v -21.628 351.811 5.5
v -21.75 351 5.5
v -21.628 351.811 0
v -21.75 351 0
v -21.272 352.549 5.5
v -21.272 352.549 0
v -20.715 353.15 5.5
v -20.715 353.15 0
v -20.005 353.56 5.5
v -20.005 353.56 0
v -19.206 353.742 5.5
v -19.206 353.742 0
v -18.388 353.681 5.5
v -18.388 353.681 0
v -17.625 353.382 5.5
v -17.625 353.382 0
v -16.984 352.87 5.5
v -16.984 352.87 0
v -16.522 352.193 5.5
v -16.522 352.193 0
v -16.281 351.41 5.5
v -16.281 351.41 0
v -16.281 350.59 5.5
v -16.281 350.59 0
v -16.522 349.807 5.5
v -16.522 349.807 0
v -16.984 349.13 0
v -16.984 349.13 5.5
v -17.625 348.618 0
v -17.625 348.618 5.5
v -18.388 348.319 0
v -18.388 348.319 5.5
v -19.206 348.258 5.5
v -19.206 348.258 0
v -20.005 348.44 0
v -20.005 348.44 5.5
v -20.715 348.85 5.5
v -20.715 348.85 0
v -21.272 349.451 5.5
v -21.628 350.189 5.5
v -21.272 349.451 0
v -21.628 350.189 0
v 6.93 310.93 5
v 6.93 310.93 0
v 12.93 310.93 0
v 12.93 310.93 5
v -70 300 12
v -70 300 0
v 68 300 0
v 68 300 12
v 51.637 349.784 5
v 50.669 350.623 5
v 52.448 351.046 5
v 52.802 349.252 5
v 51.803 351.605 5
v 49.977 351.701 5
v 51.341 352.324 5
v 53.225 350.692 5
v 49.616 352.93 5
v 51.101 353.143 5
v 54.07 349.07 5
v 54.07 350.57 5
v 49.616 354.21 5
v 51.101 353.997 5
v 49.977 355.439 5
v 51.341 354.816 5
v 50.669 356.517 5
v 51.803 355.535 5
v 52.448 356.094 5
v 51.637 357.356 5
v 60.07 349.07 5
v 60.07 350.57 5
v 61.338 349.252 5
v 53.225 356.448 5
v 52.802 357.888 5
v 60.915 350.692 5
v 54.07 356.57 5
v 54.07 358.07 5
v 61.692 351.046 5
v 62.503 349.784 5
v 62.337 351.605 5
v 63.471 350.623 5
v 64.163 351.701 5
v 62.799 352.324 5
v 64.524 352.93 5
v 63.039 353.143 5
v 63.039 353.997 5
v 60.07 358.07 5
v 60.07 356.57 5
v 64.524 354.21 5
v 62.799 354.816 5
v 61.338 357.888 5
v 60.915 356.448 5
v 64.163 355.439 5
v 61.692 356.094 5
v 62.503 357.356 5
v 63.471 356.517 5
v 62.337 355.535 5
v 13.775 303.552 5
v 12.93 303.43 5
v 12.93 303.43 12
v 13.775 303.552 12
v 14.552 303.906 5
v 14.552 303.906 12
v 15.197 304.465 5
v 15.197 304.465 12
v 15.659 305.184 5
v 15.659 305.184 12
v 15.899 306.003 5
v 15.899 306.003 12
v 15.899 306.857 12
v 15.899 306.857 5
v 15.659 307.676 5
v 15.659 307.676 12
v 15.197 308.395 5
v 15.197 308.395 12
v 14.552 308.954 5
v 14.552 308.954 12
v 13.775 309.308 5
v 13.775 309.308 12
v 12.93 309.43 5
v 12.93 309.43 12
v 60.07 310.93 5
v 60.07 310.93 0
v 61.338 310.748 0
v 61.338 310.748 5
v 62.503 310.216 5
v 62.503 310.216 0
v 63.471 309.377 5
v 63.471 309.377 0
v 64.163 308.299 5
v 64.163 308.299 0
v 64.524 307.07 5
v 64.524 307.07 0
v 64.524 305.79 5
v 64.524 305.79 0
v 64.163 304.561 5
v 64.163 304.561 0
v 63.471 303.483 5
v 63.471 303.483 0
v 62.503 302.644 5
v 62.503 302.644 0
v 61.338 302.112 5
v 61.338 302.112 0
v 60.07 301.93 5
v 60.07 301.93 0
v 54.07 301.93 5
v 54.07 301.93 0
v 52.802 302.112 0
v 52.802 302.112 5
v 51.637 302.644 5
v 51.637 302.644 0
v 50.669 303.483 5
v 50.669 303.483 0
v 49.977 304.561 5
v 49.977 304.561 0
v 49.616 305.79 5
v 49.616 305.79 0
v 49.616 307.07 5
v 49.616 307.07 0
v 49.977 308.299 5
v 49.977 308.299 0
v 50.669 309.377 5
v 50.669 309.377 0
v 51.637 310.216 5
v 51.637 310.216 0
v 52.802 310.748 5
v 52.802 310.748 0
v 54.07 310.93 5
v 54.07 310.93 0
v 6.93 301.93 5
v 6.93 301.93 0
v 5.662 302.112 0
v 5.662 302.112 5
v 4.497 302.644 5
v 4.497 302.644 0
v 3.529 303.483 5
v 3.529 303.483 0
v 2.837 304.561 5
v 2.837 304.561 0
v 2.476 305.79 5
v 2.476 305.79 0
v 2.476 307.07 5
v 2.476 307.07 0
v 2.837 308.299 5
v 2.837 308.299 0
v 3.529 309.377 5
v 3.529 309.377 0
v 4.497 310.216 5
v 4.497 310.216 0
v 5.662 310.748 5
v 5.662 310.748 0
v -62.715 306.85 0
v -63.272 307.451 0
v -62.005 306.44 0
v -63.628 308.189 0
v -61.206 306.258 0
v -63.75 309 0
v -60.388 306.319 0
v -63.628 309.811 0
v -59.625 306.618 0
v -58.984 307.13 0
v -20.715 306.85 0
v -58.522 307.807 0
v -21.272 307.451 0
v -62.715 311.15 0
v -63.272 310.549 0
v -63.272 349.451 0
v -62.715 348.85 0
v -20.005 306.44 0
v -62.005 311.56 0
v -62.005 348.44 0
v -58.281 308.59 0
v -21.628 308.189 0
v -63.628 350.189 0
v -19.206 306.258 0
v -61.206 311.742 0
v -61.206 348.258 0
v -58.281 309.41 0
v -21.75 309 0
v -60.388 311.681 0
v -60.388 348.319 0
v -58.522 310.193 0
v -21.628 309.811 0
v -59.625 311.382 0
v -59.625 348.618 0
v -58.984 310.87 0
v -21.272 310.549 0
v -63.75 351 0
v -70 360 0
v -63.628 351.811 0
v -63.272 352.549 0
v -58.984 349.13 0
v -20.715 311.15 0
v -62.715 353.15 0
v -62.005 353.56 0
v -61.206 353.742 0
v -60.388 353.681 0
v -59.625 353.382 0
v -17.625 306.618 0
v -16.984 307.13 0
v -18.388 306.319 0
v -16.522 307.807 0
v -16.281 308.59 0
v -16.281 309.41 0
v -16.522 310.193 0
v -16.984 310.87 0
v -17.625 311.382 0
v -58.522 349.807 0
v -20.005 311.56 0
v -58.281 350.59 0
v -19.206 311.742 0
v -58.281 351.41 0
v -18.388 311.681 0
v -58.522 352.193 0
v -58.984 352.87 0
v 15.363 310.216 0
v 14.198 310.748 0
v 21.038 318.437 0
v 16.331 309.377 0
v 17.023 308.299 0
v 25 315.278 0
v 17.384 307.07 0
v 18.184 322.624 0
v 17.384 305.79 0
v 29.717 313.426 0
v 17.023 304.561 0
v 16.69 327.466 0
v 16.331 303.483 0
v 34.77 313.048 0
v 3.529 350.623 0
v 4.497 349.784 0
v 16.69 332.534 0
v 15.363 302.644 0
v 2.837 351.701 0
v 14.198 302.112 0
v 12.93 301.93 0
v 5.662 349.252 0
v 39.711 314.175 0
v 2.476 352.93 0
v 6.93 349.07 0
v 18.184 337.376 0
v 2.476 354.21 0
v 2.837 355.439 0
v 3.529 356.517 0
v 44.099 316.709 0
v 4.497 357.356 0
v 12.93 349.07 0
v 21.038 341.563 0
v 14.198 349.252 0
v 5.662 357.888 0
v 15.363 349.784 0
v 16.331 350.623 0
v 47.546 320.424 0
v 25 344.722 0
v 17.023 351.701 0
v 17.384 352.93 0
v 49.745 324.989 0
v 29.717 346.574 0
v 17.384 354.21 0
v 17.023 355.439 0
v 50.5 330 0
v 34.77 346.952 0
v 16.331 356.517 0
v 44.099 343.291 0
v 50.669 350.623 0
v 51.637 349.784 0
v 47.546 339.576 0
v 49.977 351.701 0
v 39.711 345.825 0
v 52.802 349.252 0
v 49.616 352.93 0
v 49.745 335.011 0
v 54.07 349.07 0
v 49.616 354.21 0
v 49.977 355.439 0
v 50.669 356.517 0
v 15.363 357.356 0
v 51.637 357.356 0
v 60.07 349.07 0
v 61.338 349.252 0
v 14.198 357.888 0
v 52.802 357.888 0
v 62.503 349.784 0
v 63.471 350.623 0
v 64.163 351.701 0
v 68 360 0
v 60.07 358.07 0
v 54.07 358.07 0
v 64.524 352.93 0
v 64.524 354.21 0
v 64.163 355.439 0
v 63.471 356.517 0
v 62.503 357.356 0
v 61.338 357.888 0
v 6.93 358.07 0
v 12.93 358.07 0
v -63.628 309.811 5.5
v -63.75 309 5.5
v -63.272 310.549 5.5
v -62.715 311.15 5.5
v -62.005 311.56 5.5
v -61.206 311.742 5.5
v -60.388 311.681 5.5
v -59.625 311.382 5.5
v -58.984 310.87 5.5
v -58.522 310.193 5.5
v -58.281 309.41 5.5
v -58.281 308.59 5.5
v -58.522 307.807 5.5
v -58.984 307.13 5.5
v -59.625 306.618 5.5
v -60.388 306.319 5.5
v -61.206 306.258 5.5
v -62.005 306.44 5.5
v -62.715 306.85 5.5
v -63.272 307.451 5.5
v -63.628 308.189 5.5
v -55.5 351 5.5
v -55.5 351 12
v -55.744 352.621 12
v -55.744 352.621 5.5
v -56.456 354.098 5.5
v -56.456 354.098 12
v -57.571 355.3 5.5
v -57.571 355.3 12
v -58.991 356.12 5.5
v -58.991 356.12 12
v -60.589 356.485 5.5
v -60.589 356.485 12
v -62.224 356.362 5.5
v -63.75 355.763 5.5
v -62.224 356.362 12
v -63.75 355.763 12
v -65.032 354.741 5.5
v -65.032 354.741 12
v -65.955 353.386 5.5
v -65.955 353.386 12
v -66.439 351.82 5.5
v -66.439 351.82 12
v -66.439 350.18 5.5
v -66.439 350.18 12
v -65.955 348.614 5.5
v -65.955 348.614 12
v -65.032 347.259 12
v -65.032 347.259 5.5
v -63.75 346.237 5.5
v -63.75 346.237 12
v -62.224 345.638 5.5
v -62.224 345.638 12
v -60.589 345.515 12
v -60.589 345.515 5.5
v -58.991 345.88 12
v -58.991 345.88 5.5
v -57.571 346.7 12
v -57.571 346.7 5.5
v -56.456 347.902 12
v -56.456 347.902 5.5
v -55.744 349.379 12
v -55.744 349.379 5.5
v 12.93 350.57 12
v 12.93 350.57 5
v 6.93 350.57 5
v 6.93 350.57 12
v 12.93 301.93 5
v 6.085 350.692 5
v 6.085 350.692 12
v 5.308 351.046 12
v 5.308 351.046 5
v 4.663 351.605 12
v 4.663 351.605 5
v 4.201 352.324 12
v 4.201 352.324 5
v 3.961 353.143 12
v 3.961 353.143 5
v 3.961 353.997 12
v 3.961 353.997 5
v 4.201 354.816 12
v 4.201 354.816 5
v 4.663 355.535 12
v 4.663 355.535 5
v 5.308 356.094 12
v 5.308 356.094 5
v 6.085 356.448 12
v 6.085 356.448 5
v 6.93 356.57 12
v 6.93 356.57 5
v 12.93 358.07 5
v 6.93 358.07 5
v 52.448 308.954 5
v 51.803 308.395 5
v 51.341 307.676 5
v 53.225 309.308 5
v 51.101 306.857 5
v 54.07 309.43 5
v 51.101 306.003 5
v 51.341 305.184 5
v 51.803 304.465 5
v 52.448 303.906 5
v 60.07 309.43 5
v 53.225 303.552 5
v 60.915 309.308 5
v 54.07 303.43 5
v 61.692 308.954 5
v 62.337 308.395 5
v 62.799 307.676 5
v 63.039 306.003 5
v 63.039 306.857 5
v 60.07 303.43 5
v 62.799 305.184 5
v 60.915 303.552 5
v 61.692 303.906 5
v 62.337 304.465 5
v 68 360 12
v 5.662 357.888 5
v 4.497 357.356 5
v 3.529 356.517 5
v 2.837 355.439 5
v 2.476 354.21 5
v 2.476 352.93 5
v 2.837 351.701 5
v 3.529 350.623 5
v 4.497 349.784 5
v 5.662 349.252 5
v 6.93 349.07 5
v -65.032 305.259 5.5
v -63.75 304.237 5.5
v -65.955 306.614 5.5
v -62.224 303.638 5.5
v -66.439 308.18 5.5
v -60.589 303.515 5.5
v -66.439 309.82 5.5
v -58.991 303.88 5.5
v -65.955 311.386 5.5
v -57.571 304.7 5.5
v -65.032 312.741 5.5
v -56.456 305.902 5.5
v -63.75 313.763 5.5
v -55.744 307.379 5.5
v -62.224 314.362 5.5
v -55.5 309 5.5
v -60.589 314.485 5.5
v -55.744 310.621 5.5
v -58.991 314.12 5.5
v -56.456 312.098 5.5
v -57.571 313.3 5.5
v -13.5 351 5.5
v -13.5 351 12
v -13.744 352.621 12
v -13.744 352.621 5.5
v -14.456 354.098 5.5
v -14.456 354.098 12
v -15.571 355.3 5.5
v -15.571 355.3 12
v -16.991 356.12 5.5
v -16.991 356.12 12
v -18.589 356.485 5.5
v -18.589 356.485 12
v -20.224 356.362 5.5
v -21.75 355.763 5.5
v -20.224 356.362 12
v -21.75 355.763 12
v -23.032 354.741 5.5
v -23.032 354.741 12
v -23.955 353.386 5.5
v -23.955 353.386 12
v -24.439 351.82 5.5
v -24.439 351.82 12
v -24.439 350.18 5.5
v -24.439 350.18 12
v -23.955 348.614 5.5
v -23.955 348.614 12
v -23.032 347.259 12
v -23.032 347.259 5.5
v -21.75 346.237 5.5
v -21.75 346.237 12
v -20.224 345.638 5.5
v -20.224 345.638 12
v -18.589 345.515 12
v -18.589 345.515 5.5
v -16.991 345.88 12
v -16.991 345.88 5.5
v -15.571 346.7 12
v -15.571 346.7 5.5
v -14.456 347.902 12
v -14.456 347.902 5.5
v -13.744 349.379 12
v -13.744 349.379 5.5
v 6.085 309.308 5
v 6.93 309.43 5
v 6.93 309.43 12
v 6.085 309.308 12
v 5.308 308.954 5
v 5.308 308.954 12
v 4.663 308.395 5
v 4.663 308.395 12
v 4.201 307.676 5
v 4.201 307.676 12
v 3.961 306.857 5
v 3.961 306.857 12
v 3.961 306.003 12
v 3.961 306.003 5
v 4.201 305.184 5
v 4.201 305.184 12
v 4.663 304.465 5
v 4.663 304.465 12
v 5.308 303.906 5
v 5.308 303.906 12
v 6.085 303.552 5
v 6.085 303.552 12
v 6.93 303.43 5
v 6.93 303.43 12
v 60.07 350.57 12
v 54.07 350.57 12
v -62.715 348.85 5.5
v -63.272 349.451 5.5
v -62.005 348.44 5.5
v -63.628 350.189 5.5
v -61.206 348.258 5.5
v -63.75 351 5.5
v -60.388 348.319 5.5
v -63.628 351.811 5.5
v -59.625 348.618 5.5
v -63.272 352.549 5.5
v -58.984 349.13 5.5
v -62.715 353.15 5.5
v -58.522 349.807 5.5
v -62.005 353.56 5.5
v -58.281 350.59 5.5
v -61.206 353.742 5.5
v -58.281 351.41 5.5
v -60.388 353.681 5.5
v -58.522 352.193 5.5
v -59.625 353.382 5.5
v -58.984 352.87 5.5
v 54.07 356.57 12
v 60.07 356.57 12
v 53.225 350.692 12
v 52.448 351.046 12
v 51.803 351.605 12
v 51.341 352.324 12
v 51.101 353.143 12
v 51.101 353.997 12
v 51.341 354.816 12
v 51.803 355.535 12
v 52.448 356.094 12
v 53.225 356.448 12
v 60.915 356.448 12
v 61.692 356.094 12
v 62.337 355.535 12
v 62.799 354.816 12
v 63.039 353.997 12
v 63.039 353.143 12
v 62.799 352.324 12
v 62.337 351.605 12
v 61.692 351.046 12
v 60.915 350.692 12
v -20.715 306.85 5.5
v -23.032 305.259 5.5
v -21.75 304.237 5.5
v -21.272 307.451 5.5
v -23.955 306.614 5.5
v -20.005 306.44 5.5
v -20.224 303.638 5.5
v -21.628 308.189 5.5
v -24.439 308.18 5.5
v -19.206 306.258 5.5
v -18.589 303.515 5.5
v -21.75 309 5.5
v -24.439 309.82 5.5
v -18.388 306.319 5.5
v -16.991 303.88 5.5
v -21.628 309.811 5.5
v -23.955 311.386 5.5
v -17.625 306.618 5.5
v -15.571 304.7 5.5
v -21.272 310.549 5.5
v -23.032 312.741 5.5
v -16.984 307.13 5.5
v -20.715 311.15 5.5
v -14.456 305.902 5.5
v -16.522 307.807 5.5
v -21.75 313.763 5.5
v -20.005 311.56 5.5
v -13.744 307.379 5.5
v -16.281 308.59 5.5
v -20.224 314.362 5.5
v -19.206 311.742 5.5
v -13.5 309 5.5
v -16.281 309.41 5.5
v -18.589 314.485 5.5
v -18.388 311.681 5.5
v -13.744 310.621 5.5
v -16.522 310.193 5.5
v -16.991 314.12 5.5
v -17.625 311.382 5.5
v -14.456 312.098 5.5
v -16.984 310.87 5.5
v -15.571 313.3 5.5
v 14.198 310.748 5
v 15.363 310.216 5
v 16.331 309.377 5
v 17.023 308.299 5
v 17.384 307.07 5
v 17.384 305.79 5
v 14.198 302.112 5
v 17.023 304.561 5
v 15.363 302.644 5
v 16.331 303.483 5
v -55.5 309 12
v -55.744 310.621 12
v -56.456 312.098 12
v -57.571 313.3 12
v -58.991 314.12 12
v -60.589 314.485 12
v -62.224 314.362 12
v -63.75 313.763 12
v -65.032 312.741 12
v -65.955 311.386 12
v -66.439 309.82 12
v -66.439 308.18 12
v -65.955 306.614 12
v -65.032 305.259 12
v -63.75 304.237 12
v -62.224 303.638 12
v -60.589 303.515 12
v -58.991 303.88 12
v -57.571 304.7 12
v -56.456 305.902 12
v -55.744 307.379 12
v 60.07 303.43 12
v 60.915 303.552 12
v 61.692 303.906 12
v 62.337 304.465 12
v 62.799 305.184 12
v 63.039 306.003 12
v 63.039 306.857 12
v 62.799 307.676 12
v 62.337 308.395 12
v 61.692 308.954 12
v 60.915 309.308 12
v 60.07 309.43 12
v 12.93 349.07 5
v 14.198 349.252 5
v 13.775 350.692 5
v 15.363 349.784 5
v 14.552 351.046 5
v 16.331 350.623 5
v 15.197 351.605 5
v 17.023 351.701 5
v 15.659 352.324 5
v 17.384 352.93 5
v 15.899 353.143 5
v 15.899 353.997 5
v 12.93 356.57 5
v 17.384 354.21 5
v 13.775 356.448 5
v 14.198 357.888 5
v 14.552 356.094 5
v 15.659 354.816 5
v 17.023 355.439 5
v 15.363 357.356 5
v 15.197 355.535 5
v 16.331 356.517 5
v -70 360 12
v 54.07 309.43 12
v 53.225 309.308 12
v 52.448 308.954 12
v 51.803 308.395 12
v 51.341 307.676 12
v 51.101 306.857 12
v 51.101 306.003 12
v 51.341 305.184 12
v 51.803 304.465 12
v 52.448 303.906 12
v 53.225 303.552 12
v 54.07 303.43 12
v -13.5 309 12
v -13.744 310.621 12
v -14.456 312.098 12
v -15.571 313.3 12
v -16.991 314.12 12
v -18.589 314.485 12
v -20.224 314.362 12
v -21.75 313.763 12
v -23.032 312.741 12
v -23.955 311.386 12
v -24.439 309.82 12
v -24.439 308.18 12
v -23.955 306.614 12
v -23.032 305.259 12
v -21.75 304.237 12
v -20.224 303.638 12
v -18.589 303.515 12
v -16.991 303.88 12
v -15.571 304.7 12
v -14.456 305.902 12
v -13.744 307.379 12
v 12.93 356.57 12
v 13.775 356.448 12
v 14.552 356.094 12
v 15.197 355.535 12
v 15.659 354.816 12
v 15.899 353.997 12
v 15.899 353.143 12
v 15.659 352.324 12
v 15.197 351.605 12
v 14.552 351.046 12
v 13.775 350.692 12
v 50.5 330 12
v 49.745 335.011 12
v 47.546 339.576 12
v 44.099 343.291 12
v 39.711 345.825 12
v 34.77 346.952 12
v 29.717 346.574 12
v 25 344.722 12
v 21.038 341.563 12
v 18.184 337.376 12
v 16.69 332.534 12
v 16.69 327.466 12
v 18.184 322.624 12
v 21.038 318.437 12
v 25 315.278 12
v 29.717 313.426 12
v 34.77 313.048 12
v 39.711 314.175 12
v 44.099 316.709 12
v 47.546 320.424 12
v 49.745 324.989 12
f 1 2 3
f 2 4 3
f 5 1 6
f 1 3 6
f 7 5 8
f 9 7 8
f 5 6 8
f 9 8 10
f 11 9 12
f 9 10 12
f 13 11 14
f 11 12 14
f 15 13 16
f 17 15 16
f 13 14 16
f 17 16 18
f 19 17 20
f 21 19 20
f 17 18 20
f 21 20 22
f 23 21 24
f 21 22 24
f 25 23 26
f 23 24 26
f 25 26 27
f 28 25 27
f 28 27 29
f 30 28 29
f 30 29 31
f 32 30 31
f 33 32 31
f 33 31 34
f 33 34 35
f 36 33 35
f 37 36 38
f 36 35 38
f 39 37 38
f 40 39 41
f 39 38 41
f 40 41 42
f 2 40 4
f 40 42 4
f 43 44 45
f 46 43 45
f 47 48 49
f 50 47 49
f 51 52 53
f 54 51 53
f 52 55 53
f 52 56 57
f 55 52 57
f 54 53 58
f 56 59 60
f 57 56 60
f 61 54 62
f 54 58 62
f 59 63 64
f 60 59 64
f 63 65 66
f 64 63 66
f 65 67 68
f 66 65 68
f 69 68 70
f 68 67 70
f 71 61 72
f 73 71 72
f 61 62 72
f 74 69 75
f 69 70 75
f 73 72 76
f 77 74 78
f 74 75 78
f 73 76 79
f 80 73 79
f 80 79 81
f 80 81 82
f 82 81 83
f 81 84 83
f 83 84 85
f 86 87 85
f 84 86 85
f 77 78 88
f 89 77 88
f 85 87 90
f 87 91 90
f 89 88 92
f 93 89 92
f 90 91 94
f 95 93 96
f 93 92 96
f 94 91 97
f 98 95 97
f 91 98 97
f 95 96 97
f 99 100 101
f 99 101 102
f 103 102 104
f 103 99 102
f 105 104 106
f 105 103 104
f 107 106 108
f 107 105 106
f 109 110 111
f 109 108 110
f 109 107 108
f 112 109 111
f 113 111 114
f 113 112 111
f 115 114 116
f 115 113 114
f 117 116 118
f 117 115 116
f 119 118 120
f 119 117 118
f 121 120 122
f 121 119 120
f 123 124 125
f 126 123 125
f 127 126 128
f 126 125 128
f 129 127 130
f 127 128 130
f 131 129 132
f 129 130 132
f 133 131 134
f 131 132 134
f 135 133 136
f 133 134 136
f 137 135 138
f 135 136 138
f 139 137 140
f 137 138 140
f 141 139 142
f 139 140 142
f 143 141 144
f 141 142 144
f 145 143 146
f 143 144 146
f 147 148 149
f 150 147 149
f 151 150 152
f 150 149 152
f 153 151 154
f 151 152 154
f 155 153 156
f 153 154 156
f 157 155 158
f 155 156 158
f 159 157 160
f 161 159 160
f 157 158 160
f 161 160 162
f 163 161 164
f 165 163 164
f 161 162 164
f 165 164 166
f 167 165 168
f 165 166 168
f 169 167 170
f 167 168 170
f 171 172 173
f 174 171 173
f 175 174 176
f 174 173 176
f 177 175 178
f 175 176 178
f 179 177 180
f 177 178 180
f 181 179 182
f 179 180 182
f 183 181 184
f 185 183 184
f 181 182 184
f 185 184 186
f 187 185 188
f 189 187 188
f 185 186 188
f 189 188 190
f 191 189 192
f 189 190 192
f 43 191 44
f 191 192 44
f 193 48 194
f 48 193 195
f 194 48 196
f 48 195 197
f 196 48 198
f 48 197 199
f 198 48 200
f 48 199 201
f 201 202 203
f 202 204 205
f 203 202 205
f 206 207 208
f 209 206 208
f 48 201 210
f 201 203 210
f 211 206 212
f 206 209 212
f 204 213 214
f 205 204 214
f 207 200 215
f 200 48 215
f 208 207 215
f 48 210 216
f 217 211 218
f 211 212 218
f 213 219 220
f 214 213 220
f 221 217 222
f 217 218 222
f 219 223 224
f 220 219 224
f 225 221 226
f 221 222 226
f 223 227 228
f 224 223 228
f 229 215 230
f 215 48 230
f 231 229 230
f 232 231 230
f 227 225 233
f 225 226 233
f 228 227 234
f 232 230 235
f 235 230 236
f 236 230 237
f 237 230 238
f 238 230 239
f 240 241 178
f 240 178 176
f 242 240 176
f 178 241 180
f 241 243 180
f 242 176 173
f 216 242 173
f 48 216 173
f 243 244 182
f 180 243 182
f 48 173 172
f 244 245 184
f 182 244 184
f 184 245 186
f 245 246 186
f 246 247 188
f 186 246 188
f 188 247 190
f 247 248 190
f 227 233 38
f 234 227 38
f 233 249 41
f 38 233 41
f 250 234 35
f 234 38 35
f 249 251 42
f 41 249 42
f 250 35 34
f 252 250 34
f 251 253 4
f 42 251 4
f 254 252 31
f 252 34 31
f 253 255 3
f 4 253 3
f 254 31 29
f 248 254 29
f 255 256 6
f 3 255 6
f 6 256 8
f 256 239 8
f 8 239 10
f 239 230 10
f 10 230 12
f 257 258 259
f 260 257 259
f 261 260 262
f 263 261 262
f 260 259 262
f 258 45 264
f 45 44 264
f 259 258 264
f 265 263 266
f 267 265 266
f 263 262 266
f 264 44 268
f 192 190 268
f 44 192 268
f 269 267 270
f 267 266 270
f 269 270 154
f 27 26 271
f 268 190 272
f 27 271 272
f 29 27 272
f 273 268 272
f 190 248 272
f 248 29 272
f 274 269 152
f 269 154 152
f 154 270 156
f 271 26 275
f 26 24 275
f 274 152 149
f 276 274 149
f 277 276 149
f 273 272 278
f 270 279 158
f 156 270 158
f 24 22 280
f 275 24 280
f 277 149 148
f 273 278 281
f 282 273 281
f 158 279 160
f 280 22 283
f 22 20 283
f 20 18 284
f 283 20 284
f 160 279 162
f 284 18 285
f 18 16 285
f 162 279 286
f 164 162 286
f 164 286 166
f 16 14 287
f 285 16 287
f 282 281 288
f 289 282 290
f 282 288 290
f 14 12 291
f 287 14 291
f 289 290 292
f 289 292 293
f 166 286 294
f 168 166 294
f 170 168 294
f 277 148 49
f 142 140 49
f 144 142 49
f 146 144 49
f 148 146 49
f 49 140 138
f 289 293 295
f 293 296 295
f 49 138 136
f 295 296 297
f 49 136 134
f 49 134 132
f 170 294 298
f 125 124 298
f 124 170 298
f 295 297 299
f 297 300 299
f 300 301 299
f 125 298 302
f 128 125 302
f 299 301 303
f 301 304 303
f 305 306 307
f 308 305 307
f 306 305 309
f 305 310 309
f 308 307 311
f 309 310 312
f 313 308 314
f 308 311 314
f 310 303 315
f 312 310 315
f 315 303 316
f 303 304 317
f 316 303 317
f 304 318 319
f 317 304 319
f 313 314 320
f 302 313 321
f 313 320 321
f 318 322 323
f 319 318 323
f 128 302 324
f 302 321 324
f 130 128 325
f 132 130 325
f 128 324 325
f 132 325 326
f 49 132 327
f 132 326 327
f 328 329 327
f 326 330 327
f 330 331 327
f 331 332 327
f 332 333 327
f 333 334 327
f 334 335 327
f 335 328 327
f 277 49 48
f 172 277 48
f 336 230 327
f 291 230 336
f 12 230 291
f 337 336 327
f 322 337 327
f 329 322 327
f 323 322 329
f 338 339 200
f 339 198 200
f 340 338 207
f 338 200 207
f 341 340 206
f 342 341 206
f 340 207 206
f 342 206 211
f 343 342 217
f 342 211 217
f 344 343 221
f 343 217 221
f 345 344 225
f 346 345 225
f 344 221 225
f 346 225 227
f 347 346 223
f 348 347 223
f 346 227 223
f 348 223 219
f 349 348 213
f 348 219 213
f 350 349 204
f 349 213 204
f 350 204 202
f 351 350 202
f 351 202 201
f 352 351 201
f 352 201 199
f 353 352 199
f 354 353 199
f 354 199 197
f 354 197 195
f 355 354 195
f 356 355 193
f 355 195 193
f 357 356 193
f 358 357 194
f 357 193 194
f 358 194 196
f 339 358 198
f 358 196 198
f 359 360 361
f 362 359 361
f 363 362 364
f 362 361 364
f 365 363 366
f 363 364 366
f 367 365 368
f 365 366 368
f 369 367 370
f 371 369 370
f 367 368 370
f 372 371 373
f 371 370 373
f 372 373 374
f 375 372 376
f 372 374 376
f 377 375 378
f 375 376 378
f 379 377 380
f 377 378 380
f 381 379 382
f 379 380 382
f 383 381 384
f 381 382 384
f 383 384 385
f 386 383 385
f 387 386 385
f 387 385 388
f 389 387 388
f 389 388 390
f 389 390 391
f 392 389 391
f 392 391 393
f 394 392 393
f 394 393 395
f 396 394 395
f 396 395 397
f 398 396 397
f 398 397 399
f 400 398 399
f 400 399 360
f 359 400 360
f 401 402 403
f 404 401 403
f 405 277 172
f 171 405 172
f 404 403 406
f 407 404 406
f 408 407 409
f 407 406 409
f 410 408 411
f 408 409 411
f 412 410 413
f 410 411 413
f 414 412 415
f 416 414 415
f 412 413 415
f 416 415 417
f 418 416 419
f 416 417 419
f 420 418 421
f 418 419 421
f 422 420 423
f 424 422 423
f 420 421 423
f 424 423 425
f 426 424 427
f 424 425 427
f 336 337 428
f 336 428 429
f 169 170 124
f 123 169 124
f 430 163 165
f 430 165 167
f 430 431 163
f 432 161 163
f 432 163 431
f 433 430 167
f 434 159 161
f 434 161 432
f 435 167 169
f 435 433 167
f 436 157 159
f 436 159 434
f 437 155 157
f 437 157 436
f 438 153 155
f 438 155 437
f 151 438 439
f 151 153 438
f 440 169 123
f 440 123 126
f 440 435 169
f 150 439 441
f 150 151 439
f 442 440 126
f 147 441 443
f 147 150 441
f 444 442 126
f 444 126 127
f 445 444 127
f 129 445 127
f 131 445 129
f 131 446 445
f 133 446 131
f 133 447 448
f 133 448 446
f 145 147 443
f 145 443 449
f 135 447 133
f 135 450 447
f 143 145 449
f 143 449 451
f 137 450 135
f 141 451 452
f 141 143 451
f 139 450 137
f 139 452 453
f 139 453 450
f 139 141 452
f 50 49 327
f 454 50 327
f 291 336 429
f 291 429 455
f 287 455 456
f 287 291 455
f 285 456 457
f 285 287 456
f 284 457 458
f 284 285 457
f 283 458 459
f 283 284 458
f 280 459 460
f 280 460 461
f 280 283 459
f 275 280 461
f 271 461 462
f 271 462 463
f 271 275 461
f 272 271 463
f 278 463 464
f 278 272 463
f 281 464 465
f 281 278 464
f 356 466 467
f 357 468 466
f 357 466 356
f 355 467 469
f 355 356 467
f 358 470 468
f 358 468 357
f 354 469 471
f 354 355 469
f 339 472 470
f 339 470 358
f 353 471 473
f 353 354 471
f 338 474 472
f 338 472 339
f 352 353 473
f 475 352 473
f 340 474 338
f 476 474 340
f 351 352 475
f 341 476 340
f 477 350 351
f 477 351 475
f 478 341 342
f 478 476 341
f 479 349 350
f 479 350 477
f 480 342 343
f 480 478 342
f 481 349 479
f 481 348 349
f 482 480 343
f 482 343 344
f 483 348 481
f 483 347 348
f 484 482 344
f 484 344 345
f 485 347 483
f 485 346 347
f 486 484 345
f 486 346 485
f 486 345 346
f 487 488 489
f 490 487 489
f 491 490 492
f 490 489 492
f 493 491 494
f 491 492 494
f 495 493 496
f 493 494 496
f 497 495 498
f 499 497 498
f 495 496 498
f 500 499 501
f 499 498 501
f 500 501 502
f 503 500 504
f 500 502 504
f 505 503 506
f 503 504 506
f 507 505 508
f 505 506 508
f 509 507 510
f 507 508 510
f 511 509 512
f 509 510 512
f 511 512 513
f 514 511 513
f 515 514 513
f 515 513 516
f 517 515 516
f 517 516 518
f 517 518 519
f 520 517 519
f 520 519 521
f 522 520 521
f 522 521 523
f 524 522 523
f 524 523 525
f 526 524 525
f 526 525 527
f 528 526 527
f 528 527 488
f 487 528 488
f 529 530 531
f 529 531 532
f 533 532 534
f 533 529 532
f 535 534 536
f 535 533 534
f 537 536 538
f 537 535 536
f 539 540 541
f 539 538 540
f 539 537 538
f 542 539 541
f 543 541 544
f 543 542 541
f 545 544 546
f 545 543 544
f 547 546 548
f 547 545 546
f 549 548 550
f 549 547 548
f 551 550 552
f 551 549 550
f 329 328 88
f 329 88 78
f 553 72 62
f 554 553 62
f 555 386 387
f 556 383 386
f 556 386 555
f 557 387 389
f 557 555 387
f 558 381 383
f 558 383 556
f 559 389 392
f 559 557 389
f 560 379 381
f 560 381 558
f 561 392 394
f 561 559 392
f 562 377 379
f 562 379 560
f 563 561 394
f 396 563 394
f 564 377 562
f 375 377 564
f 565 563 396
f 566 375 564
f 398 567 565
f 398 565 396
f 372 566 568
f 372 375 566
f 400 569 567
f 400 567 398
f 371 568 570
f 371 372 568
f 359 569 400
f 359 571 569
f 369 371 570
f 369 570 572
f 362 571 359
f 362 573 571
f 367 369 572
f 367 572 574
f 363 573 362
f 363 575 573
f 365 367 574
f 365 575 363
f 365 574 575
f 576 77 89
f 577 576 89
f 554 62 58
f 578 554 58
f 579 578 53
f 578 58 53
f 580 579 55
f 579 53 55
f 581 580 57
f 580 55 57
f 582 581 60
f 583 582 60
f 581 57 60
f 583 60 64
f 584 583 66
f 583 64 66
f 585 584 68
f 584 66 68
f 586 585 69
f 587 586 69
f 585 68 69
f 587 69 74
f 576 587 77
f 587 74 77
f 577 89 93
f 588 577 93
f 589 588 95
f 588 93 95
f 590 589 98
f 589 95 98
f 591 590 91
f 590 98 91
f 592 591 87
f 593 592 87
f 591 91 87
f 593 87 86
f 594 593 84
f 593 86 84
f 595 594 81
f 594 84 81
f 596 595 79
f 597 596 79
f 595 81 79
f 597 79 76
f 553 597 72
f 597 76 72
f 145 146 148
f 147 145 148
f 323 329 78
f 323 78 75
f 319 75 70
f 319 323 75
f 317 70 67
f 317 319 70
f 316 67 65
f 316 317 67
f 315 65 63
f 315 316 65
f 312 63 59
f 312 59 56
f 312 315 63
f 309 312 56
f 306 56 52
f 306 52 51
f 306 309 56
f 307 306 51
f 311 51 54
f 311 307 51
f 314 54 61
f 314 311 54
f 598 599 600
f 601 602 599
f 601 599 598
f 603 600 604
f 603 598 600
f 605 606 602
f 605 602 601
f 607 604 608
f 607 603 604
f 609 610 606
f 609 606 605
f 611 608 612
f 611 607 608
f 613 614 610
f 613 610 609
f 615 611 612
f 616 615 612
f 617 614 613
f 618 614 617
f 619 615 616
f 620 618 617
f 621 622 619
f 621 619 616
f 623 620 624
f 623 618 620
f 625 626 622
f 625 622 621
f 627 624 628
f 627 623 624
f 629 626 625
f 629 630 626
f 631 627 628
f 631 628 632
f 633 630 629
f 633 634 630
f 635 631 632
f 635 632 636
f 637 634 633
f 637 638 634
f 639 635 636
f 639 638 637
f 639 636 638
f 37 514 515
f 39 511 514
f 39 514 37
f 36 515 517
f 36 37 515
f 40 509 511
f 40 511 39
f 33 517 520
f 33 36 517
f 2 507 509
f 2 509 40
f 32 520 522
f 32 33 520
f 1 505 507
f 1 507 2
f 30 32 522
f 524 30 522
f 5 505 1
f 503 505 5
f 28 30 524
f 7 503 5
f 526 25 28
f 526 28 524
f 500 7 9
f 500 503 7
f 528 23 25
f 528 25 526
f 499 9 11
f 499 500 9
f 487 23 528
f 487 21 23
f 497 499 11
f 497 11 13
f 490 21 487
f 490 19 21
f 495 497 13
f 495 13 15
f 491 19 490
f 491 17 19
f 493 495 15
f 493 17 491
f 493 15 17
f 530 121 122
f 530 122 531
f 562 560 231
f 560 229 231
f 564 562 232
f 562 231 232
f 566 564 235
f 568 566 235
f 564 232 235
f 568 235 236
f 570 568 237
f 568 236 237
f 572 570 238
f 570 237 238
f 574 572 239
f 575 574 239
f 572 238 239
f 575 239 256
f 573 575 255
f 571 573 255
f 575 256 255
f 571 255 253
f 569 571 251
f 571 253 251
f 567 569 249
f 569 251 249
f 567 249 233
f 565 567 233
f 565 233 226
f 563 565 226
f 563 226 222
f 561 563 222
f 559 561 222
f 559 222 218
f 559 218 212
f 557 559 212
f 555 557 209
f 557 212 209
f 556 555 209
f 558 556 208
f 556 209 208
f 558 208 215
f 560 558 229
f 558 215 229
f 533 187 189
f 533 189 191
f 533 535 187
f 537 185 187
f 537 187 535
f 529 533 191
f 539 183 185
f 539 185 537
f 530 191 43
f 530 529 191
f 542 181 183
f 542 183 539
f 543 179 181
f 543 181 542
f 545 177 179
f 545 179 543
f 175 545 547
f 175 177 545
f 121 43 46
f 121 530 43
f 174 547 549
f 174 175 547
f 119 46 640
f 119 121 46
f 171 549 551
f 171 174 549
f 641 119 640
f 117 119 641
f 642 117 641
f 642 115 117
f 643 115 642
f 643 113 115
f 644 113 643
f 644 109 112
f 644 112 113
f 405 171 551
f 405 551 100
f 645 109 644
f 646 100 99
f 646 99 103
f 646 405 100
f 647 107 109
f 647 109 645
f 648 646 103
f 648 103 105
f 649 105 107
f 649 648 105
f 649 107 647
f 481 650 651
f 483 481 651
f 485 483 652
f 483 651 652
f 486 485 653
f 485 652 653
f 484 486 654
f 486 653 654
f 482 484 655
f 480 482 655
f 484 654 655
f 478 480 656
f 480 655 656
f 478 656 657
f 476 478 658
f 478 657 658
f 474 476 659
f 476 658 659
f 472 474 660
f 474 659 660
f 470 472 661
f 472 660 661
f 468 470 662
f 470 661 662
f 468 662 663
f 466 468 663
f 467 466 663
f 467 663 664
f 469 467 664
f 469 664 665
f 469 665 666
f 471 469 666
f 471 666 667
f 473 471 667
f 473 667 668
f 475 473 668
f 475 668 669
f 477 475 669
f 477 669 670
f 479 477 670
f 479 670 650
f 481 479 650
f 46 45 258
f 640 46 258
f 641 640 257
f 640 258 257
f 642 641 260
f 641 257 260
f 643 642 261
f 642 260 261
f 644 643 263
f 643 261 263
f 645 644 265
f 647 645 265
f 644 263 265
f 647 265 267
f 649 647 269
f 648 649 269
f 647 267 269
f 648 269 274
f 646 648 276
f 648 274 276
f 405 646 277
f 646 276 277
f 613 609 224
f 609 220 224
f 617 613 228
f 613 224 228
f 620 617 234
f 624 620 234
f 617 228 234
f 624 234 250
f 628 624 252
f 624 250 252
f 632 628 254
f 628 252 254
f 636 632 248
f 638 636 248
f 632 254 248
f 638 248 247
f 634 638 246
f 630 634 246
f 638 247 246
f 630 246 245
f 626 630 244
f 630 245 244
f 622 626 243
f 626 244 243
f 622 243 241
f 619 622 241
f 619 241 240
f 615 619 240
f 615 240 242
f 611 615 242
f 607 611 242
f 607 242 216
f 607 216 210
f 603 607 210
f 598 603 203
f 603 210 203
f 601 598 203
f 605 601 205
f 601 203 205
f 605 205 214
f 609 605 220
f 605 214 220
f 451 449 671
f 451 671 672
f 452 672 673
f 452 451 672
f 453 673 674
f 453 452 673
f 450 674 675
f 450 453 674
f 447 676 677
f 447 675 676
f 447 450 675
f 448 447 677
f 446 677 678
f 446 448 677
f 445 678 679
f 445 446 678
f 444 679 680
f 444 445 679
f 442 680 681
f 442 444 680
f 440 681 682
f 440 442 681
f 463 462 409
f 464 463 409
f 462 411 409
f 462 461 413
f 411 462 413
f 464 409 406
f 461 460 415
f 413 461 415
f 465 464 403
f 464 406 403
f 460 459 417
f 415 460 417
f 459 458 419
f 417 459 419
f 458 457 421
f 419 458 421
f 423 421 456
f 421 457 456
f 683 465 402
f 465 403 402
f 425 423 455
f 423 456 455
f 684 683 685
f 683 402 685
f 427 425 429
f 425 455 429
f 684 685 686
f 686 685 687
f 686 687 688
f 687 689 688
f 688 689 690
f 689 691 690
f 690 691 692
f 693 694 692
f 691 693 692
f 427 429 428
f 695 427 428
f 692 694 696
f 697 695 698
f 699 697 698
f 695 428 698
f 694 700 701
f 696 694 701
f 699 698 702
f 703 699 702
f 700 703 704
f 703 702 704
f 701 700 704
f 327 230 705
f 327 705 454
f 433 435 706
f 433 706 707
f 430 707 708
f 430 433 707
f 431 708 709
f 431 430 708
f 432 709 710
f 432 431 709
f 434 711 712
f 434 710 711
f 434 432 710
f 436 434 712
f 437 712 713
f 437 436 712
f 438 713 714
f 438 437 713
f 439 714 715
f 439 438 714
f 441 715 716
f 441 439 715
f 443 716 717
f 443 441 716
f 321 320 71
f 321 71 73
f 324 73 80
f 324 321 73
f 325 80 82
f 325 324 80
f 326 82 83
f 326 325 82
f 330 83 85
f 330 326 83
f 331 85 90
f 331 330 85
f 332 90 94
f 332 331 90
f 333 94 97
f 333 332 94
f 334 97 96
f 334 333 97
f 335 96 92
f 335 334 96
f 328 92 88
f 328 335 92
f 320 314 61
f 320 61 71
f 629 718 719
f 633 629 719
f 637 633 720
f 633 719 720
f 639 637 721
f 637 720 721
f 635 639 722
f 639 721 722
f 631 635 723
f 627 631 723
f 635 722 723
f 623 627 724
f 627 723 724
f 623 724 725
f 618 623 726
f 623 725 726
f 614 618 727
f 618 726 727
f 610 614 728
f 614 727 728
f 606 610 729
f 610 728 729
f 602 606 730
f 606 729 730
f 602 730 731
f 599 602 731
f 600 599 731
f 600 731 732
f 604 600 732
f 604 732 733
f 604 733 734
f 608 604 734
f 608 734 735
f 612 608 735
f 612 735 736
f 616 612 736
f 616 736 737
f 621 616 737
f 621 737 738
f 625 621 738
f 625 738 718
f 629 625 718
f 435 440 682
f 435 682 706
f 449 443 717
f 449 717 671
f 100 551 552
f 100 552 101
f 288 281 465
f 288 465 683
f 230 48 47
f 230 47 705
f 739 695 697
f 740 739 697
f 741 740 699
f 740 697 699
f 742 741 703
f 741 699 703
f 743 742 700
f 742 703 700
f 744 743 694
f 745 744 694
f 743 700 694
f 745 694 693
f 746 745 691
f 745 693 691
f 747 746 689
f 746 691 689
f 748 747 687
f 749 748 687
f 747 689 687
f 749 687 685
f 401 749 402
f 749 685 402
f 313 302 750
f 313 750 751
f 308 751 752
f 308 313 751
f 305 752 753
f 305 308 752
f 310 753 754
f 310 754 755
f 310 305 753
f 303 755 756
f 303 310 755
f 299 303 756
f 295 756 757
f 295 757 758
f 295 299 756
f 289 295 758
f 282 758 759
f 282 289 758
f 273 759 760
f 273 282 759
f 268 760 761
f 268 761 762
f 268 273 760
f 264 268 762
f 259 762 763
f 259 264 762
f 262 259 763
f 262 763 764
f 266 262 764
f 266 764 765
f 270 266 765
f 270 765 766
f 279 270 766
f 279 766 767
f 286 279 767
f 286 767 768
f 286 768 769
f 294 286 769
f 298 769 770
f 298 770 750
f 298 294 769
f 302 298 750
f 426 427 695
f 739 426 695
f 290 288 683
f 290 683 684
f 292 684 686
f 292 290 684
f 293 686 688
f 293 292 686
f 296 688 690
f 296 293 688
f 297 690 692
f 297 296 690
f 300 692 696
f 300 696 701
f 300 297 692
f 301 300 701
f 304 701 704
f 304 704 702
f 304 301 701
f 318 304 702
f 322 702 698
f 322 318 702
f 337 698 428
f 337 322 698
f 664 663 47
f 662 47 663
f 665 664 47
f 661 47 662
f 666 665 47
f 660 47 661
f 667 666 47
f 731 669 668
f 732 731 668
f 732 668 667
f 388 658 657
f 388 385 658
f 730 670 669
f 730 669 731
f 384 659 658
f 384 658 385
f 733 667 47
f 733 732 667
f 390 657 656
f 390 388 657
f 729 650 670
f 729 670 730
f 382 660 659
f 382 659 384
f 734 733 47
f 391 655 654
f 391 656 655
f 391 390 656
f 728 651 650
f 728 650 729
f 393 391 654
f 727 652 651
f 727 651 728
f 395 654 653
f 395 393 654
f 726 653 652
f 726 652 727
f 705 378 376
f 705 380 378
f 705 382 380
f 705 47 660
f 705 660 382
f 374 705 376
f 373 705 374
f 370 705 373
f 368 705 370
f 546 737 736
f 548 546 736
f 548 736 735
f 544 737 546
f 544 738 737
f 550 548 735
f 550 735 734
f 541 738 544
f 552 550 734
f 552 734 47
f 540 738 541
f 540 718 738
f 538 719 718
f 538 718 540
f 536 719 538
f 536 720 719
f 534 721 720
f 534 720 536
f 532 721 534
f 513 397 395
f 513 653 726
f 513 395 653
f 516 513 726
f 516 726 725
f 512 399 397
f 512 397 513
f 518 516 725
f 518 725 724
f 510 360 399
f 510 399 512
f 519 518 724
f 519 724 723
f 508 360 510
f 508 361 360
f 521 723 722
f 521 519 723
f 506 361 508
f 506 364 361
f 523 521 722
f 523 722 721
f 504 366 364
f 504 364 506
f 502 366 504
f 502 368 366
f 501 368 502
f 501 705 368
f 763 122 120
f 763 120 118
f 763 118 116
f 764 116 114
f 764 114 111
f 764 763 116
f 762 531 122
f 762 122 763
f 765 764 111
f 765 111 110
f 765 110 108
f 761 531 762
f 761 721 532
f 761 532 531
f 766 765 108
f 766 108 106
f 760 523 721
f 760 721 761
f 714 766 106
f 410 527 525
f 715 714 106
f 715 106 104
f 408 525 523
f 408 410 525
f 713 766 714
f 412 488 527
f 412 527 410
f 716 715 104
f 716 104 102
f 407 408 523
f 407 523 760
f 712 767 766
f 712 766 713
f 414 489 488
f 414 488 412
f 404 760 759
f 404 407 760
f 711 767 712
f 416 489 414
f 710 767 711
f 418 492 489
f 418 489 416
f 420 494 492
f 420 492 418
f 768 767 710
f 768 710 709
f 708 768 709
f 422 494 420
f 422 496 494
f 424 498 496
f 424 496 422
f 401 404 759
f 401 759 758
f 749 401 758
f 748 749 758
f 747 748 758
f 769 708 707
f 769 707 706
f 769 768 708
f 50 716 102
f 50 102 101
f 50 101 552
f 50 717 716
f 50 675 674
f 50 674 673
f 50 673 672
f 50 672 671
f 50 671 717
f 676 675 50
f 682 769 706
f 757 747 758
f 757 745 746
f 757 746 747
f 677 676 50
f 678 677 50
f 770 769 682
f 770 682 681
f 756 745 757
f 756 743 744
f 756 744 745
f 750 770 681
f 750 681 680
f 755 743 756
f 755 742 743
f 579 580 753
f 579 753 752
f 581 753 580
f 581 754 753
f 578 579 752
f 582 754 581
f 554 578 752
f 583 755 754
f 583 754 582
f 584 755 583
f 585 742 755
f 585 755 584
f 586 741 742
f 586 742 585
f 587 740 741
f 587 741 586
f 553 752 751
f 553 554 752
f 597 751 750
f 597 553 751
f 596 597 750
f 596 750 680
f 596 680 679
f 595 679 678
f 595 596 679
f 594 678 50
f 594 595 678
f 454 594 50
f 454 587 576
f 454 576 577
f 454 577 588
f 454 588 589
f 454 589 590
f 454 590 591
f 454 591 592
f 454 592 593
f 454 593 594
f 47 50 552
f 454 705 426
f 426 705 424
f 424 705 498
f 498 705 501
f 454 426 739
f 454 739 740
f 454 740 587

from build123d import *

# Parameters (mm, degrees)
SZKIC1_W                                             = 138
SZKIC1_H                                             = 60
SZKIC1_R                                             = 17
DODANIE_WYCI_GNI_CIE1_DEPTH                          = 12
POG_BIENIE_WALCOWE_POD_M5_WKR_T_DO_CZ_CI_D           = 5.5
POG_BIENIE_WALCOWE_POD_M5_WKR_T_DO_CZ_CI_CBORE_D     = 11
POG_BIENIE_WALCOWE_POD_M5_WKR_T_DO_CZ_CI_CBORE_DEPTH = 6.5
WYTNIJ_WYCI_GNI_CIE1_DEPTH                           = 5
WYTNIJ_WYCI_GNI_CIE2_DEPTH                           = 367.809214715


with BuildPart() as part:
    # Szkic1 → Dodanie-wyciągnięcie1 (new body)
    with BuildSketch(Plane.XY):
        with Locations((-1, 330)):
            Rectangle(SZKIC1_W, SZKIC1_H)
        with Locations((33.5, 330)):
            Circle(SZKIC1_R, mode=Mode.SUBTRACT)
    extrude(amount=DODANIE_WYCI_GNI_CIE1_DEPTH)

    # Pogłębienie walcowe pod M5 Wkręt do części metalowych z łbem sześciokątnym1 (through all)
    with Locations(Plane.XY.offset(12)):
        with Locations((-61, 351), (-19, 351), (-61, 309), (-19, 309)):
            CounterBoreHole(POG_BIENIE_WALCOWE_POD_M5_WKR_T_DO_CZ_CI_D / 2, POG_BIENIE_WALCOWE_POD_M5_WKR_T_DO_CZ_CI_CBORE_D / 2, POG_BIENIE_WALCOWE_POD_M5_WKR_T_DO_CZ_CI_CBORE_DEPTH)

    # Szkic5 → Wytnij-wyciągnięcie1 (cut)
    with BuildSketch(Plane(origin=(0, 0, 0), x_dir=(-1, 0, 0), z_dir=(0, 0, -1))):
        with BuildLine():
            Line((-12.93, 358.07), (-6.93, 358.07))
            ThreePointArc((-6.93, 358.07), (-2.43, 353.57), (-6.93, 349.07))
            Line((-6.93, 349.07), (-12.93, 349.07))
            ThreePointArc((-12.93, 349.07), (-17.43, 353.57), (-12.93, 358.07))
        make_face()
        with BuildLine():
            Line((-60.07, 358.07), (-54.07, 358.07))
            ThreePointArc((-54.07, 358.07), (-49.57, 353.57), (-54.07, 349.07))
            Line((-54.07, 349.07), (-60.07, 349.07))
            ThreePointArc((-60.07, 349.07), (-64.57, 353.57), (-60.07, 358.07))
        make_face()
    wytnij_wyci_gni_cie1 = extrude(amount=-WYTNIJ_WYCI_GNI_CIE1_DEPTH, mode=Mode.SUBTRACT)

    # Szkic7 → Wytnij-wyciągnięcie2 (cut, through all)
    with BuildSketch(Plane(origin=(0, 0, 5), x_dir=(-1, 0, 0), z_dir=(0, 0, -1))):
        with BuildLine():
            Line((-60.07, 350.57), (-54.07, 350.57))
            ThreePointArc((-54.07, 350.57), (-51.07, 353.57), (-54.07, 356.57))
            Line((-54.07, 356.57), (-60.07, 356.57))
            ThreePointArc((-60.07, 356.57), (-63.07, 353.57), (-60.07, 350.57))
        make_face()
        with BuildLine():
            Line((-12.93, 350.57), (-6.93, 350.57))
            ThreePointArc((-6.93, 350.57), (-3.93, 353.57), (-6.93, 356.57))
            Line((-6.93, 356.57), (-12.93, 356.57))
            ThreePointArc((-12.93, 356.57), (-15.93, 353.57), (-12.93, 350.57))
        make_face()
    wytnij_wyci_gni_cie2 = extrude(amount=-WYTNIJ_WYCI_GNI_CIE2_DEPTH, mode=Mode.SUBTRACT)

    # Lustro1: Wytnij-wyciągnięcie1, Wytnij-wyciągnięcie2 across plane
    add(wytnij_wyci_gni_cie1.mirror(Plane.ZX.offset(330)), mode=Mode.SUBTRACT)
    add(wytnij_wyci_gni_cie2.mirror(Plane.ZX.offset(330)), mode=Mode.SUBTRACT)


solid = part.part
